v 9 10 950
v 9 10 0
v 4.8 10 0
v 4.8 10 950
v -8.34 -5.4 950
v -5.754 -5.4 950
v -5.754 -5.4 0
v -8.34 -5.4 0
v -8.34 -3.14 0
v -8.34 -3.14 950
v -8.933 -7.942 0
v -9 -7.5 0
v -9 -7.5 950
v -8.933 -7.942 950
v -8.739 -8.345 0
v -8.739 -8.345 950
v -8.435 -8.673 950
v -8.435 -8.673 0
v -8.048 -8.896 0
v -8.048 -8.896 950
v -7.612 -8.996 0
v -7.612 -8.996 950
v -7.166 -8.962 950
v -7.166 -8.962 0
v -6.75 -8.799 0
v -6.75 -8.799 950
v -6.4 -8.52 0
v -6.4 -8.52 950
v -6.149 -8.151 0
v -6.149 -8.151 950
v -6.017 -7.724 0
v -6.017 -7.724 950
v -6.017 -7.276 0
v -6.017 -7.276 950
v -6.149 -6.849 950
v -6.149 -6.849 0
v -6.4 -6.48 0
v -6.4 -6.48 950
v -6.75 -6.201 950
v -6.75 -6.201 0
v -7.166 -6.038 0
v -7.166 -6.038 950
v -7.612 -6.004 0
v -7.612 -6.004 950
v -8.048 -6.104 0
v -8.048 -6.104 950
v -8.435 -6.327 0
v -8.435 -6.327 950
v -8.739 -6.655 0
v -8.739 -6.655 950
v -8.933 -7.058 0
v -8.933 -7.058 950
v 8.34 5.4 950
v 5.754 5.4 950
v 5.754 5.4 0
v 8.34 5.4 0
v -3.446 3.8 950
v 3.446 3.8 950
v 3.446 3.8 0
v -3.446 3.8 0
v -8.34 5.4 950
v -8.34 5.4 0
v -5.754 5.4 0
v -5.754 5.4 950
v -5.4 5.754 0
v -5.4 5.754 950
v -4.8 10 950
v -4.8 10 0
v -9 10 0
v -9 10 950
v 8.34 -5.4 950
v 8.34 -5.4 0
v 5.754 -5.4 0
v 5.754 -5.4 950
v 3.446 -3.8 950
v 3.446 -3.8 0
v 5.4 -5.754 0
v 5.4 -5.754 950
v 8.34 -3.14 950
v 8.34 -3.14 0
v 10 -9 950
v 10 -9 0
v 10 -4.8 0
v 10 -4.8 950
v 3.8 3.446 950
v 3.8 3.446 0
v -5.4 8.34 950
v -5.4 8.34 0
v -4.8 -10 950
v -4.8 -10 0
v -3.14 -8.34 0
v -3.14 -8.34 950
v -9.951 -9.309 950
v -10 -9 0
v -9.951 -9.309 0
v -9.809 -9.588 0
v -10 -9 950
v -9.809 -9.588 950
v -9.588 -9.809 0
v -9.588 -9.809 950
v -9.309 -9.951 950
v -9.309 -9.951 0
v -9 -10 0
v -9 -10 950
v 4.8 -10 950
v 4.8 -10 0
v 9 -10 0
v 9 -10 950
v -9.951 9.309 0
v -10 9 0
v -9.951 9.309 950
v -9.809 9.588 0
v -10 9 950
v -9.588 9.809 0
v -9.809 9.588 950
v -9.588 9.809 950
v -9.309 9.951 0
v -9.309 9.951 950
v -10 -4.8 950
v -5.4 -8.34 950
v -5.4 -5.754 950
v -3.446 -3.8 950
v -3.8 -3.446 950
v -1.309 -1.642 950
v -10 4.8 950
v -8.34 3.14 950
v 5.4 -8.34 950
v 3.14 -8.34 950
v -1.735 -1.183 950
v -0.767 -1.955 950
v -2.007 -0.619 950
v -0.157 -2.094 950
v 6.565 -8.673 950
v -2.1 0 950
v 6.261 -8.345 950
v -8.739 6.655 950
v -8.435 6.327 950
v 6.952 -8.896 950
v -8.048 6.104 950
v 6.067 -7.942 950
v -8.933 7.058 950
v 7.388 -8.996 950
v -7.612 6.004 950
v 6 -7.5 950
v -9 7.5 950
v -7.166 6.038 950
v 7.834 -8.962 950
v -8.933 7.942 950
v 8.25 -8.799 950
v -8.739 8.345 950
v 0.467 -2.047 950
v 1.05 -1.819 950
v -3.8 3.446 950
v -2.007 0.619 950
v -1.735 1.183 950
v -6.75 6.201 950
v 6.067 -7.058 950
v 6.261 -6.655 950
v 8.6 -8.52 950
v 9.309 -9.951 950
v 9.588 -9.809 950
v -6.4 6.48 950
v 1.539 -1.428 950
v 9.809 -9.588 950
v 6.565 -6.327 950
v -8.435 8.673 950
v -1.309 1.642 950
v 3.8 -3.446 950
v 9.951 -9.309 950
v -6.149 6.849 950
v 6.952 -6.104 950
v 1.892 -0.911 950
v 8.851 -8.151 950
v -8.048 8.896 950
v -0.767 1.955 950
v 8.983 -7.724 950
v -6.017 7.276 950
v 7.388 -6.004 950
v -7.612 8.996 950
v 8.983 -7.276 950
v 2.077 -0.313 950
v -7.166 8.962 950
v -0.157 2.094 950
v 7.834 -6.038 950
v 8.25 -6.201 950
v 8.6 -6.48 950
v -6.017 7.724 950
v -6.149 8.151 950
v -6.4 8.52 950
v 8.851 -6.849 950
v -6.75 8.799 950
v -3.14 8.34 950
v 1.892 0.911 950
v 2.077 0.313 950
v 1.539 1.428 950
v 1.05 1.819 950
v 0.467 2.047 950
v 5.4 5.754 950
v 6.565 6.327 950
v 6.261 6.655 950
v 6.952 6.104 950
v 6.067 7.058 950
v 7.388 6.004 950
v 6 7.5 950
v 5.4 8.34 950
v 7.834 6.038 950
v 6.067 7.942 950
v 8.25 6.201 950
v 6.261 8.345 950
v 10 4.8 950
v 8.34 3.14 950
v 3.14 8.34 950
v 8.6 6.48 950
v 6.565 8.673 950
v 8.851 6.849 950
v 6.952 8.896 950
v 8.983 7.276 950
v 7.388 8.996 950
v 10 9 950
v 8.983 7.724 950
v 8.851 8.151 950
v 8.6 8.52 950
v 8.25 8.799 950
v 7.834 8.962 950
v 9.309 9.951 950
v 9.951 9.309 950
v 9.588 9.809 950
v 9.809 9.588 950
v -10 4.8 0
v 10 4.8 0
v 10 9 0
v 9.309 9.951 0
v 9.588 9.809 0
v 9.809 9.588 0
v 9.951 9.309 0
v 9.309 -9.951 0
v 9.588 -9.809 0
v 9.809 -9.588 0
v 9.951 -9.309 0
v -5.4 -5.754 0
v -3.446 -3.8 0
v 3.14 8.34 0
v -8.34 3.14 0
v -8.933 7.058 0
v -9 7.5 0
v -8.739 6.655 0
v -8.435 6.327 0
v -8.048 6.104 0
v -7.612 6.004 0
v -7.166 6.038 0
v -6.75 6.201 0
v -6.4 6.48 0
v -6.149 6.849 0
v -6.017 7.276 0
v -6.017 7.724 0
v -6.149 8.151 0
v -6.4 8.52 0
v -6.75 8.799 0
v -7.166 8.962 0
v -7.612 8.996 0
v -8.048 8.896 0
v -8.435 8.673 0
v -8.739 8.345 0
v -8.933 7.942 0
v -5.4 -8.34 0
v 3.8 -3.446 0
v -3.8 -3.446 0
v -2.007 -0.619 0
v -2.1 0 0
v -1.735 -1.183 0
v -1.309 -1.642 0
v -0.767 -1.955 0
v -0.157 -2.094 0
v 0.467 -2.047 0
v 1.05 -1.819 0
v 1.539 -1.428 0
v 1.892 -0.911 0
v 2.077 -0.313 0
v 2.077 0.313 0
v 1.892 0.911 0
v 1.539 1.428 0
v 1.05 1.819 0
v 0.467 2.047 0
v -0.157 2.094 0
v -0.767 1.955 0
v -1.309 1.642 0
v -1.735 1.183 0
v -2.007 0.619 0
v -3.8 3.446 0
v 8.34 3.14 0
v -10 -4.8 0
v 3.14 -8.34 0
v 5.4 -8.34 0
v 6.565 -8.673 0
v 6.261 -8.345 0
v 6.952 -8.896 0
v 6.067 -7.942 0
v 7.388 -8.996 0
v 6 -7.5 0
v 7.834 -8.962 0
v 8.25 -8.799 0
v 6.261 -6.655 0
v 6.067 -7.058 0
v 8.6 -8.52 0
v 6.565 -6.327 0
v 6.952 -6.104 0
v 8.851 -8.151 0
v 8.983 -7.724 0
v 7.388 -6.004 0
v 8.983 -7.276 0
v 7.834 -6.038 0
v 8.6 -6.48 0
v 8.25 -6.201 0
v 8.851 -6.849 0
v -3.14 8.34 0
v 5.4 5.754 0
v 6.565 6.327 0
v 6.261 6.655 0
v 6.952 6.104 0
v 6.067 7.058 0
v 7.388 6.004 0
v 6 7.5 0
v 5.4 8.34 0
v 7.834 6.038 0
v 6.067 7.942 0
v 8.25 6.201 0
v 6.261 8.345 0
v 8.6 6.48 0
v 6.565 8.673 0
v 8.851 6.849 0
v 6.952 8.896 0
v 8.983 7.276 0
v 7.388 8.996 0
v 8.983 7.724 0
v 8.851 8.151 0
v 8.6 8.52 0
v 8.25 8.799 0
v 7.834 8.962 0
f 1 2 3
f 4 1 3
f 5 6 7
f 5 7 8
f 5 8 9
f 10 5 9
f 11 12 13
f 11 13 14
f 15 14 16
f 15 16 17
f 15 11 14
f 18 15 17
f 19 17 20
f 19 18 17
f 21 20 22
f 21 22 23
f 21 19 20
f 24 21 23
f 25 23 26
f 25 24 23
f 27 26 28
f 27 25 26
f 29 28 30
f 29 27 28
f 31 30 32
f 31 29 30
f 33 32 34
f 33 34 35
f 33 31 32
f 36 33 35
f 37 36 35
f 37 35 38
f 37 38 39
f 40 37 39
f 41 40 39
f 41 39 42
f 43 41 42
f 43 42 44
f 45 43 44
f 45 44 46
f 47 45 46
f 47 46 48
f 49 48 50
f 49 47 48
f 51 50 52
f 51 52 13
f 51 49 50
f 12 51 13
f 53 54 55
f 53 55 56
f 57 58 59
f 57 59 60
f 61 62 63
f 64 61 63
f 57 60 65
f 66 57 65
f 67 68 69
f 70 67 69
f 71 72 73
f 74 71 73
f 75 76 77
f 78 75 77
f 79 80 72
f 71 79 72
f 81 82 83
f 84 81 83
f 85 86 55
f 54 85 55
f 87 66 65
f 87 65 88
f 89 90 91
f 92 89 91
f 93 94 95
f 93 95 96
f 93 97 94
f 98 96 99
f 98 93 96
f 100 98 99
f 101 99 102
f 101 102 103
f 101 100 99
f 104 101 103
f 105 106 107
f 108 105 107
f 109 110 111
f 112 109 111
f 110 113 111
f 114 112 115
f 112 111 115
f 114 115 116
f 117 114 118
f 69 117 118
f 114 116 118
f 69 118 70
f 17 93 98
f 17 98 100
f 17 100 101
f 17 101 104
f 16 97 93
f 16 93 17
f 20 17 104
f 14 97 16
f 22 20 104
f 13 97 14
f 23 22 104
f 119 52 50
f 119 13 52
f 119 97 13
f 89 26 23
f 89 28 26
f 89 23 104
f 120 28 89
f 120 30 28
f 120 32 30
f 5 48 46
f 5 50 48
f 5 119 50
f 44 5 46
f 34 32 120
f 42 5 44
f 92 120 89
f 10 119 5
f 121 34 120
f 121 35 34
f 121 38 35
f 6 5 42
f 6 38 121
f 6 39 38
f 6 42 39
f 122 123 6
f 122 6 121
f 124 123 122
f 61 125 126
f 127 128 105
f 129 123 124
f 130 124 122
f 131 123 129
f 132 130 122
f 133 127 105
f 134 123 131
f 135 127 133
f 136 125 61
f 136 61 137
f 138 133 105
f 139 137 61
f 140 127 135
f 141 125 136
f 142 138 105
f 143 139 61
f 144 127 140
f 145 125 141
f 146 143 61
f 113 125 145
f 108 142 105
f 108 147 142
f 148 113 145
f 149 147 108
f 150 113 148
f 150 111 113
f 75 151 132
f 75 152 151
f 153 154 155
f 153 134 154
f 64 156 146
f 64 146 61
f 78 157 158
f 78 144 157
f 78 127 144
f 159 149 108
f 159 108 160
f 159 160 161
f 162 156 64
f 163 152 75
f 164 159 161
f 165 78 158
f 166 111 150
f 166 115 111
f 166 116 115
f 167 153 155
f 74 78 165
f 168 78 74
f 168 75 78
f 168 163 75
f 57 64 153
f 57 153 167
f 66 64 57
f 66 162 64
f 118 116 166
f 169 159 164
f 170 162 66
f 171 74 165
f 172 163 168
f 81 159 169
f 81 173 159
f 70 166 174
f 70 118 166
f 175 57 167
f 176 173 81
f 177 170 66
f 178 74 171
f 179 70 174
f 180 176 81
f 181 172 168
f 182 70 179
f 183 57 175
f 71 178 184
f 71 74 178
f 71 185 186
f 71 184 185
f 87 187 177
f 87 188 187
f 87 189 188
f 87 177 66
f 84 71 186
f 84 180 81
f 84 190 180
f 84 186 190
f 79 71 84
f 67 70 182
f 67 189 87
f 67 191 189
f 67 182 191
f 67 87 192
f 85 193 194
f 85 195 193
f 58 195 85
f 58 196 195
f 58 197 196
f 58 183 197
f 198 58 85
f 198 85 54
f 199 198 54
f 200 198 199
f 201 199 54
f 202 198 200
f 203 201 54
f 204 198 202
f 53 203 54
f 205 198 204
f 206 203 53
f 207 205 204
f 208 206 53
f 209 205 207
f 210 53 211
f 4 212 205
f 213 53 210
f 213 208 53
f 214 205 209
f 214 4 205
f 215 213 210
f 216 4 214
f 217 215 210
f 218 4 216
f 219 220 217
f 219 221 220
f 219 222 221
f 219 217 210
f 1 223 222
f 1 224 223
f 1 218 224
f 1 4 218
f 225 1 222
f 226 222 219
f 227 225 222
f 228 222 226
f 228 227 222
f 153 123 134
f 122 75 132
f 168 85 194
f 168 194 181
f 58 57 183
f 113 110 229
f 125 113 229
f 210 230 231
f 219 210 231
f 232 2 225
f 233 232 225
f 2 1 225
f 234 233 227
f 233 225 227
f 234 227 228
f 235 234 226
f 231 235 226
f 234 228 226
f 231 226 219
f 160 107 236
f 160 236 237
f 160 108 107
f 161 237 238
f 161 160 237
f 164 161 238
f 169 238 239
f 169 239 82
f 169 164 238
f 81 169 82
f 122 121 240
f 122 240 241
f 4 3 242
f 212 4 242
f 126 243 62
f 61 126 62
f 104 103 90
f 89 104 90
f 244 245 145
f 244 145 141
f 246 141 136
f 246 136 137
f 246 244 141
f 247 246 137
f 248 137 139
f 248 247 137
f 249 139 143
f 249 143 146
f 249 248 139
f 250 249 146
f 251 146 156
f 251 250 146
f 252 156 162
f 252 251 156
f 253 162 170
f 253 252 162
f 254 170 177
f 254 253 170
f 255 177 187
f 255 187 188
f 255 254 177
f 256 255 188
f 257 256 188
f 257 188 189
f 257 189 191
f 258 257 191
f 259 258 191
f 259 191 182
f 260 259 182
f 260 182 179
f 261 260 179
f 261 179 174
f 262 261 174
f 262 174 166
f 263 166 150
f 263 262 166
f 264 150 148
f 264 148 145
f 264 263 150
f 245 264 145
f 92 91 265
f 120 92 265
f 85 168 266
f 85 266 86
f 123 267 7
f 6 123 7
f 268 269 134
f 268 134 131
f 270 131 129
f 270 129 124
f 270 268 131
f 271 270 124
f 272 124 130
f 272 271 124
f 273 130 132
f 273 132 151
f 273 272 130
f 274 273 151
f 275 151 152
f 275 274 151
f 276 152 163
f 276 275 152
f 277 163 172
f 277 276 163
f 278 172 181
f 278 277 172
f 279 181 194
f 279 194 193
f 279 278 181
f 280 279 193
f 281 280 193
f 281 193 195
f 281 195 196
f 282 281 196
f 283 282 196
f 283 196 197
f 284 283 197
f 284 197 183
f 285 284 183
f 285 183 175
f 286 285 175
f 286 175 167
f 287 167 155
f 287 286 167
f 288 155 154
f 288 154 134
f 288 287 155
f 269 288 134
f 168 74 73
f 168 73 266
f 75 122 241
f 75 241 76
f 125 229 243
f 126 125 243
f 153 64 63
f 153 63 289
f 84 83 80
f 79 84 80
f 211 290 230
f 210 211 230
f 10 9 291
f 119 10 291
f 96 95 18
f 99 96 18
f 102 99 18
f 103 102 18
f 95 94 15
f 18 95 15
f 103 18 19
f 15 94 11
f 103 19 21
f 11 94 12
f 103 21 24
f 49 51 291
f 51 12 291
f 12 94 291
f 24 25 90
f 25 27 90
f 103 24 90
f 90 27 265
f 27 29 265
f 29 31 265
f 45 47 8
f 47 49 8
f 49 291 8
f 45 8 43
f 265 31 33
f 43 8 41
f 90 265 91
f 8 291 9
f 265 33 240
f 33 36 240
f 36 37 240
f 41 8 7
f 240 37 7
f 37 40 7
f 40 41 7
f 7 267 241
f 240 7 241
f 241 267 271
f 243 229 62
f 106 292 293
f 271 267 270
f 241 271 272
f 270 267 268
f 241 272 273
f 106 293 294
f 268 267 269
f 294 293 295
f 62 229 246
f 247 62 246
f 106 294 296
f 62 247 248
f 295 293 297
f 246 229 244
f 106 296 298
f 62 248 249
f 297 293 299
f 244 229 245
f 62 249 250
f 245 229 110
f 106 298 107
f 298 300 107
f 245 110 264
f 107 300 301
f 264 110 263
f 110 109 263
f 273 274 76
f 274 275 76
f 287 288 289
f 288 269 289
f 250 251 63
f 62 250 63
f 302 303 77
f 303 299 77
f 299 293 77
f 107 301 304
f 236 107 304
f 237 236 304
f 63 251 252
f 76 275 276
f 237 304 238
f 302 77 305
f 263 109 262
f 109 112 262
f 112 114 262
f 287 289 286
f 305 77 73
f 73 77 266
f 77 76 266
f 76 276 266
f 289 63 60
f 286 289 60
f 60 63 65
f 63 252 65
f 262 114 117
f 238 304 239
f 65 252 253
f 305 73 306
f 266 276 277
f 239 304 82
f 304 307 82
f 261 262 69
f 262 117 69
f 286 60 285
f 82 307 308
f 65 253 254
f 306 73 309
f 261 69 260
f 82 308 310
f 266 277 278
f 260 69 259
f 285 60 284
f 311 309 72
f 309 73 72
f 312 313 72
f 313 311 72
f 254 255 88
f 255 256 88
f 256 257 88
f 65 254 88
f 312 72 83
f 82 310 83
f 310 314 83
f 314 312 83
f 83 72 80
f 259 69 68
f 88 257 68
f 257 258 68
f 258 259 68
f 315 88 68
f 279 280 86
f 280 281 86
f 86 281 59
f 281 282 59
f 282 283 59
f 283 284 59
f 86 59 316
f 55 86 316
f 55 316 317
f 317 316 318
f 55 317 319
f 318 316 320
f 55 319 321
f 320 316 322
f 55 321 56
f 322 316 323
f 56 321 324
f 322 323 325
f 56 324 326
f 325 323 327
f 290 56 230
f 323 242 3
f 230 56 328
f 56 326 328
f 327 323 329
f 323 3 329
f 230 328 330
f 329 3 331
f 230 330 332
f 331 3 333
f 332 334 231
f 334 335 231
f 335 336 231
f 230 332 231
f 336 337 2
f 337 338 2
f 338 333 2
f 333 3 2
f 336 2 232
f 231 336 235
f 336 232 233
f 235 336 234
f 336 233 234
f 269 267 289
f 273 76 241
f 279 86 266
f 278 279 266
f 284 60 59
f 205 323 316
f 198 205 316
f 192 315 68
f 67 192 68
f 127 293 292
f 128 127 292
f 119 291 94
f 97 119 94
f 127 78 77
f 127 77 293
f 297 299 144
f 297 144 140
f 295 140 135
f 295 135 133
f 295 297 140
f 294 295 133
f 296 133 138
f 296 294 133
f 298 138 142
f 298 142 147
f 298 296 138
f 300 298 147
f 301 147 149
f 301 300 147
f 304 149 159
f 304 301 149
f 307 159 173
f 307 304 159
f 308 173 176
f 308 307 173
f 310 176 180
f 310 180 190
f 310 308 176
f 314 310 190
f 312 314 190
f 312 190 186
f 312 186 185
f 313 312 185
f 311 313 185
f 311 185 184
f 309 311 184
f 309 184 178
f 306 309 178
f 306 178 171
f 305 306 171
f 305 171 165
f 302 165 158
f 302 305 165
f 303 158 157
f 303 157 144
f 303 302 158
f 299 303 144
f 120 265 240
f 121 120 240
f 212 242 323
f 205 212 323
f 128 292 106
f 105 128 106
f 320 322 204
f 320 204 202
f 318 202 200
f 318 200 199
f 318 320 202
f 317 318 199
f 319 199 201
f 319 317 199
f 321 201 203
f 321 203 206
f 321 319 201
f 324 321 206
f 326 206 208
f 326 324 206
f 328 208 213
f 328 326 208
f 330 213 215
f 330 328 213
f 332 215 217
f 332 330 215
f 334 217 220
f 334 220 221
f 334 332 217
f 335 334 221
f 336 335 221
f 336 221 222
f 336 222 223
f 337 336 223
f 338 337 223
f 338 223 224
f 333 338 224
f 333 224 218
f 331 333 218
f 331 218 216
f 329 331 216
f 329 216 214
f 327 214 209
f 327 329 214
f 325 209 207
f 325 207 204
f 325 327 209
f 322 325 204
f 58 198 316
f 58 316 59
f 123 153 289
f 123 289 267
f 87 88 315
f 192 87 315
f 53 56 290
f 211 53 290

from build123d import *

# Parameters (mm, degrees)
SKETCH_1_R      = 1.5
SKETCH_1_R_2    = 2.1
EXTRUDE_1_DEPTH = 950
FILLET_1_R      = 1


with BuildPart() as part:
    # 草图1 → 凸台-拉伸1 (new body)
    with BuildSketch(Plane.XY):
        Polygon((-10, 10), (-10, 4.8), (-8.34, 3.14), (-8.34, 5.4), (-5.753553391, 5.4), (-3.8, 3.446446609), (-3.8, -3.446446609), (-5.753553391, -5.4), (-8.34, -5.4), (-8.34, -3.14), (-10, -4.8), (-10, -10), (-4.8, -10), (-3.14, -8.34), (-5.4, -8.34), (-5.4, -5.753553391), (-3.446446609, -3.8), (3.446446609, -3.8), (5.4, -5.753553391), (5.4, -8.34), (3.14, -8.34), (4.8, -10), (10, -10), (10, -4.8), (8.34, -3.14), (8.34, -5.4), (5.753553391, -5.4), (3.8, -3.446446609), (3.8, 3.446446609), (5.753553391, 5.4), (8.34, 5.4), (8.34, 3.14), (10, 4.8), (10, 10), (4.8, 10), (3.14, 8.34), (5.4, 8.34), (5.4, 5.753553391), (3.446446609, 3.8), (-3.446446609, 3.8), (-5.4, 5.753553391), (-5.4, 8.34), (-3.14, 8.34), (-4.8, 10), align=None)
        with Locations(Location((-7.5, 7.5, 0), (0, 0, 180))):
            Circle(SKETCH_1_R, mode=Mode.SUBTRACT)
        with Locations(Location((0, 0, 0), (0, 0, 180))):
            Circle(SKETCH_1_R_2, mode=Mode.SUBTRACT)
        with Locations(Location((-7.5, -7.5, 0), (0, 0, 180))):
            Circle(SKETCH_1_R, mode=Mode.SUBTRACT)
        with Locations(Location((7.5, -7.5, 0), (0, 0, 180))):
            Circle(SKETCH_1_R, mode=Mode.SUBTRACT)
        with Locations(Location((7.5, 7.5, 0), (0, 0, 180))):
            Circle(SKETCH_1_R, mode=Mode.SUBTRACT)
    extrude(amount=EXTRUDE_1_DEPTH)

    # 圆角1
    fillet_1_edges = [part.edges().sort_by_distance(p)[0] for p in [
        (10, 10, 475),
        (10, -10, 475),
        (-10, -10, 475),
        (-10, 10, 475),
    ]]
    fillet(fillet_1_edges, radius=FILLET_1_R)


solid = part.part
